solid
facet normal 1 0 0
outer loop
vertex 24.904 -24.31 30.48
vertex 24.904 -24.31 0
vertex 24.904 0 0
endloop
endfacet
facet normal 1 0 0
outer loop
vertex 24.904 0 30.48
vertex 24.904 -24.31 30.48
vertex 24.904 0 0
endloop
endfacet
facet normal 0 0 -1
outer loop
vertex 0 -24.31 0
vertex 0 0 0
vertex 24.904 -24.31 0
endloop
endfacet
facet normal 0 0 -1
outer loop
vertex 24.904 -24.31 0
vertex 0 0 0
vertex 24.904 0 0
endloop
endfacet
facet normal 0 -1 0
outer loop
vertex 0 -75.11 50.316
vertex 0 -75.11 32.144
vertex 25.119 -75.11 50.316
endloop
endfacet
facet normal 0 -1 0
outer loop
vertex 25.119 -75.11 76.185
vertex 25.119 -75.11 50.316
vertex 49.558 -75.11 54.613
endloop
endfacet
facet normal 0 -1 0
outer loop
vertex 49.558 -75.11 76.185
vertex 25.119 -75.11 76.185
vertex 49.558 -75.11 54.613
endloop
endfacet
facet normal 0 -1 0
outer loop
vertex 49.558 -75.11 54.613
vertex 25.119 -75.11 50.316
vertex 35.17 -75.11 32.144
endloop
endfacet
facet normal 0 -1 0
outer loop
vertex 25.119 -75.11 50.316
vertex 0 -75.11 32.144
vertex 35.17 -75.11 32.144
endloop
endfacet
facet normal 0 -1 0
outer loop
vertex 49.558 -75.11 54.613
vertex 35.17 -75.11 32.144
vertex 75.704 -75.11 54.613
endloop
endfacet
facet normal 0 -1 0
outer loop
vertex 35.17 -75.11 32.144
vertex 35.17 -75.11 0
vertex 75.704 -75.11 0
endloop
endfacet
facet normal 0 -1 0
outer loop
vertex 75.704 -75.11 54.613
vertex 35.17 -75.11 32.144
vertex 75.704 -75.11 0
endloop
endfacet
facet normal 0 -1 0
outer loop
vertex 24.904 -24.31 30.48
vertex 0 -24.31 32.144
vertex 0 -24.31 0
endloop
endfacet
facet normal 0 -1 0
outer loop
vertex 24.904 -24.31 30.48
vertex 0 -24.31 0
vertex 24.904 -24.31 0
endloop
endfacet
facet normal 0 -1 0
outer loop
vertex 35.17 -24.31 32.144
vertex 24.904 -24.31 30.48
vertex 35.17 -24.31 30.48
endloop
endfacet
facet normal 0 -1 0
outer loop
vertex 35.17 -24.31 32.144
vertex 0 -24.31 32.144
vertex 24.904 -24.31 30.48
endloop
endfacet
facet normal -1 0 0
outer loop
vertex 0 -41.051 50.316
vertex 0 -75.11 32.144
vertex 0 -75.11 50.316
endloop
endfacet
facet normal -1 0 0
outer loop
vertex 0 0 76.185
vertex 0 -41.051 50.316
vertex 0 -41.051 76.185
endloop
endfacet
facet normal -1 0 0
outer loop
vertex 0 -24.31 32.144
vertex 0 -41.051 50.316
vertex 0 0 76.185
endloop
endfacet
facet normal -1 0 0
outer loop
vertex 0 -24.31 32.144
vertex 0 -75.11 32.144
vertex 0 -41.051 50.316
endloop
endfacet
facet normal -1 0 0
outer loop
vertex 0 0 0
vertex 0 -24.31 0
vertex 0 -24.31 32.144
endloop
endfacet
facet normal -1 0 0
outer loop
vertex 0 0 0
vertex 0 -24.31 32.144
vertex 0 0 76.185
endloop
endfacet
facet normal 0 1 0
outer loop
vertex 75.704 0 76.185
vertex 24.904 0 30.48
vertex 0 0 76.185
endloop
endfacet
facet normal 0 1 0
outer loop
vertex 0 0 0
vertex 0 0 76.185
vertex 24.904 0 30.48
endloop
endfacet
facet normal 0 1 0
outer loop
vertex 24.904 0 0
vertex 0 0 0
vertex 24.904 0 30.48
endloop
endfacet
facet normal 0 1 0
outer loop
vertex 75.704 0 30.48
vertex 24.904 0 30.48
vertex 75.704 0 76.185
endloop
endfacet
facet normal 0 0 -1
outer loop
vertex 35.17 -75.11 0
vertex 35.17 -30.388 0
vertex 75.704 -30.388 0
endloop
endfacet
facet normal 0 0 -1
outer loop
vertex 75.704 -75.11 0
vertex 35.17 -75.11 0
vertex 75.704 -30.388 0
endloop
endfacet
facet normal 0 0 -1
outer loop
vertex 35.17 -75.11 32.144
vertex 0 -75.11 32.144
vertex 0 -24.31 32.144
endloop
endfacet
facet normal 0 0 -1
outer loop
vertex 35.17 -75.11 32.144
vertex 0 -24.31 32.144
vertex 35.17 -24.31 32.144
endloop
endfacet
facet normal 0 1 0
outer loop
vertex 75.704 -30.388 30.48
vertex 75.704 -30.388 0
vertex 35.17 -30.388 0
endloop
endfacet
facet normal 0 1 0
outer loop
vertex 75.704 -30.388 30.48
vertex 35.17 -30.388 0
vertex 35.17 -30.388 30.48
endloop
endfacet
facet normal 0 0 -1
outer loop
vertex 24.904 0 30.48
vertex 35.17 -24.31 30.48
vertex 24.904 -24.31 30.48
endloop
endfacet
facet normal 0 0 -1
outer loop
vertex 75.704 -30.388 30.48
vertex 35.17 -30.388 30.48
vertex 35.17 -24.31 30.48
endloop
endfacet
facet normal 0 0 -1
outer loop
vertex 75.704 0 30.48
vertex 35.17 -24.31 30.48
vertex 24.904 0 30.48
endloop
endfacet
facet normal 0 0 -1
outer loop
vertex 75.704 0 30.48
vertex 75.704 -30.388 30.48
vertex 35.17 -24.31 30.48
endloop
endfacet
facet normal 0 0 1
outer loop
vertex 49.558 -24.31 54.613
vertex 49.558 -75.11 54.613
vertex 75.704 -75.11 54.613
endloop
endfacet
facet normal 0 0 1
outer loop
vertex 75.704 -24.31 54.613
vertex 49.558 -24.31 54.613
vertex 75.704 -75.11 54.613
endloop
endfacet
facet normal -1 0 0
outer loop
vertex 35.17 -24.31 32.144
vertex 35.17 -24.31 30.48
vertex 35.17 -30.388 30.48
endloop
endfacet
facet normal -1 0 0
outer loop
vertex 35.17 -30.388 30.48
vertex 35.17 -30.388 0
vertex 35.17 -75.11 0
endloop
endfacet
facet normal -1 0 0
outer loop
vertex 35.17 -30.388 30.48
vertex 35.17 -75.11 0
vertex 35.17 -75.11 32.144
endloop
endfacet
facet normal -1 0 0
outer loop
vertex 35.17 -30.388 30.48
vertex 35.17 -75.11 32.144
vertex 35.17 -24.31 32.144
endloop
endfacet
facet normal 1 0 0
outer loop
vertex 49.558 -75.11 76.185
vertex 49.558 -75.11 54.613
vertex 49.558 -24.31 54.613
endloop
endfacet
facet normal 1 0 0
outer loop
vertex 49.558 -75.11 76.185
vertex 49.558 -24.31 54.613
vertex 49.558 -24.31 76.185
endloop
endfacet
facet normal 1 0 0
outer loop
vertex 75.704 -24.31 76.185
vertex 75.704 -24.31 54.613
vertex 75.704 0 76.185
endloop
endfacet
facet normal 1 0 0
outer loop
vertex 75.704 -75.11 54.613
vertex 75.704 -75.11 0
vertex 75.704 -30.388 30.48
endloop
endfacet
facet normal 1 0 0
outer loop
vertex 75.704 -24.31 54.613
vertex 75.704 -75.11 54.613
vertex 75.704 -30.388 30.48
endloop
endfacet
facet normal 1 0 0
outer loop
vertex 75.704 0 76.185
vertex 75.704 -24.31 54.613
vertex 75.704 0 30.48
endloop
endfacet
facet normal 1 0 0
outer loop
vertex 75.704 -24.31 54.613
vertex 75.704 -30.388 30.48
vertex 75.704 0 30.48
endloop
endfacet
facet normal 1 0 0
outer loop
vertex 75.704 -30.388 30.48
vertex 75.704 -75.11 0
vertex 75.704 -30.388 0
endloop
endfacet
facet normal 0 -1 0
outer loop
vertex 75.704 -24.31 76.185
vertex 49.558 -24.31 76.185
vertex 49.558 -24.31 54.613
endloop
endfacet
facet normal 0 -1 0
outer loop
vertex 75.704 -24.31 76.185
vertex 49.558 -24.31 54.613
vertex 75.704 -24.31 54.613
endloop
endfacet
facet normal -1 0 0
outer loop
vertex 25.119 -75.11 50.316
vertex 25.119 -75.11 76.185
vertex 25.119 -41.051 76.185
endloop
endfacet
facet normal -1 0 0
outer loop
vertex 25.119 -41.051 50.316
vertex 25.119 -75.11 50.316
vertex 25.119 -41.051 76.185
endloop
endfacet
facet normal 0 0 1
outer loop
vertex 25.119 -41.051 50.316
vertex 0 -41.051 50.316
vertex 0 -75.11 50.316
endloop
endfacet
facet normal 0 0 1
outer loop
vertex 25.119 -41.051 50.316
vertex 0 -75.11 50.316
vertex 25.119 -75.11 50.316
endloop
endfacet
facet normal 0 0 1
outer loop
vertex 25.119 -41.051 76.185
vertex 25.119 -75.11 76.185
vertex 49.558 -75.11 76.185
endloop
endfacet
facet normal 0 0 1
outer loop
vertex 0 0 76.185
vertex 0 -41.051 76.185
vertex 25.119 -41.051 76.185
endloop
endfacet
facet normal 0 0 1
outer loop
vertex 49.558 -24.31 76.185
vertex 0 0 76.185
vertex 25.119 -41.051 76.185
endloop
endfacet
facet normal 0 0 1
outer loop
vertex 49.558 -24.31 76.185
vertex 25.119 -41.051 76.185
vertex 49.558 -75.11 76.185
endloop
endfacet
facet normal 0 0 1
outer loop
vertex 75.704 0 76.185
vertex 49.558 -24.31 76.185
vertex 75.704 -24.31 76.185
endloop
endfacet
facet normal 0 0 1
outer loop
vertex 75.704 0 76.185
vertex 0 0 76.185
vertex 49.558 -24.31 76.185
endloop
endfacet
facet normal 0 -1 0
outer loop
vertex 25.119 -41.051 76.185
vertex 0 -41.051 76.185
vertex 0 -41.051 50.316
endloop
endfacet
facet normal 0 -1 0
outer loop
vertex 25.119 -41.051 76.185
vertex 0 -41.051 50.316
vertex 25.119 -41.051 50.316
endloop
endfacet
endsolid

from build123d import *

# Parameters (mm, degrees)
F0_W      = 75.7038891315
F0_H      = 75.1095712185
F1_DEPTH  = 76.1847347021
F3_DEPTH  = 7.5595728122
F4_W      = 75.7038891315
F4_H      = 76.1847347021
F5_DEPTH  = 70.3715533018
F6_W      = 35.1695269346
F6_H      = 32.1441143751
F7_DEPTH  = 50.8
F8_W      = 26.1460281909
F8_H      = 21.5719044209
F9_DEPTH  = 50.8
F10_W     = 30.3881298751
F10_H     = 30.4796360433
F11_DEPTH = 50.8
F13_W     = 25.1194015145
F13_H     = 34.0582877398
F14_DEPTH = 25.8685164154


with BuildPart() as f1:
    # F0 (on Top) → F1 (new body)
    with BuildSketch(Plane.XY):
        with Locations((37.8519445658, -37.5547856092)):
            Rectangle(F0_W, F0_H)
    extrude(amount=F1_DEPTH)

    # F2 (on face) → F3 (join)
    with BuildSketch(Plane.XZ.offset(75.1095712185)):
        Polygon((75.7038891315, 0), (38.7951347365, 39.0415483477), (0, 0), align=None)
        Polygon((75.7038891315, 76.1847347021), (37.8519445658, 40.0392413139), (38.7951347365, 39.0415483477), align=None)
        Polygon((75.7038891315, 76.1847347021), (0, 76.1847347021), (37.8519445658, 40.0392413139), align=None)
    extrude(amount=-F3_DEPTH)

    # F4 (on face) → F5 (join)
    with BuildSketch(Plane.XZ.offset(75.1095712185)):
        with Locations((37.8519445658, 38.0923673511)):
            Rectangle(F4_W, F4_H)
    extrude(amount=-F5_DEPTH)

    # F6 (on face) → F7 (cut)
    with BuildSketch(Plane.XZ.offset(75.1095712185)):
        with Locations((17.5847634673, 16.0720571876)):
            Rectangle(F6_W, F6_H)
    extrude(amount=-F7_DEPTH, mode=Mode.SUBTRACT)

    # F8 (on face) → F9 (cut)
    with BuildSketch(Plane.XZ.offset(75.1095712185)):
        with Locations((62.6308750361, 65.3987824917)):
            Rectangle(F8_W, F8_H)
    extrude(amount=-F9_DEPTH, mode=Mode.SUBTRACT)

    # F10 (on face) → F11 (cut)
    with BuildSketch(Plane.YZ.offset(75.7038891315)):
        with Locations((-15.1940649375, 15.2398180217)):
            Rectangle(F10_W, F10_H)
    extrude(amount=-F11_DEPTH, mode=Mode.SUBTRACT)

    # F13 (on face) → F14 (cut)
    with BuildSketch(Plane.XY.offset(76.1847347021)):
        with Locations((12.5597007573, -58.0804273486)):
            Rectangle(F13_W, F13_H)
    extrude(amount=-F14_DEPTH, mode=Mode.SUBTRACT)


solid = f1.part
